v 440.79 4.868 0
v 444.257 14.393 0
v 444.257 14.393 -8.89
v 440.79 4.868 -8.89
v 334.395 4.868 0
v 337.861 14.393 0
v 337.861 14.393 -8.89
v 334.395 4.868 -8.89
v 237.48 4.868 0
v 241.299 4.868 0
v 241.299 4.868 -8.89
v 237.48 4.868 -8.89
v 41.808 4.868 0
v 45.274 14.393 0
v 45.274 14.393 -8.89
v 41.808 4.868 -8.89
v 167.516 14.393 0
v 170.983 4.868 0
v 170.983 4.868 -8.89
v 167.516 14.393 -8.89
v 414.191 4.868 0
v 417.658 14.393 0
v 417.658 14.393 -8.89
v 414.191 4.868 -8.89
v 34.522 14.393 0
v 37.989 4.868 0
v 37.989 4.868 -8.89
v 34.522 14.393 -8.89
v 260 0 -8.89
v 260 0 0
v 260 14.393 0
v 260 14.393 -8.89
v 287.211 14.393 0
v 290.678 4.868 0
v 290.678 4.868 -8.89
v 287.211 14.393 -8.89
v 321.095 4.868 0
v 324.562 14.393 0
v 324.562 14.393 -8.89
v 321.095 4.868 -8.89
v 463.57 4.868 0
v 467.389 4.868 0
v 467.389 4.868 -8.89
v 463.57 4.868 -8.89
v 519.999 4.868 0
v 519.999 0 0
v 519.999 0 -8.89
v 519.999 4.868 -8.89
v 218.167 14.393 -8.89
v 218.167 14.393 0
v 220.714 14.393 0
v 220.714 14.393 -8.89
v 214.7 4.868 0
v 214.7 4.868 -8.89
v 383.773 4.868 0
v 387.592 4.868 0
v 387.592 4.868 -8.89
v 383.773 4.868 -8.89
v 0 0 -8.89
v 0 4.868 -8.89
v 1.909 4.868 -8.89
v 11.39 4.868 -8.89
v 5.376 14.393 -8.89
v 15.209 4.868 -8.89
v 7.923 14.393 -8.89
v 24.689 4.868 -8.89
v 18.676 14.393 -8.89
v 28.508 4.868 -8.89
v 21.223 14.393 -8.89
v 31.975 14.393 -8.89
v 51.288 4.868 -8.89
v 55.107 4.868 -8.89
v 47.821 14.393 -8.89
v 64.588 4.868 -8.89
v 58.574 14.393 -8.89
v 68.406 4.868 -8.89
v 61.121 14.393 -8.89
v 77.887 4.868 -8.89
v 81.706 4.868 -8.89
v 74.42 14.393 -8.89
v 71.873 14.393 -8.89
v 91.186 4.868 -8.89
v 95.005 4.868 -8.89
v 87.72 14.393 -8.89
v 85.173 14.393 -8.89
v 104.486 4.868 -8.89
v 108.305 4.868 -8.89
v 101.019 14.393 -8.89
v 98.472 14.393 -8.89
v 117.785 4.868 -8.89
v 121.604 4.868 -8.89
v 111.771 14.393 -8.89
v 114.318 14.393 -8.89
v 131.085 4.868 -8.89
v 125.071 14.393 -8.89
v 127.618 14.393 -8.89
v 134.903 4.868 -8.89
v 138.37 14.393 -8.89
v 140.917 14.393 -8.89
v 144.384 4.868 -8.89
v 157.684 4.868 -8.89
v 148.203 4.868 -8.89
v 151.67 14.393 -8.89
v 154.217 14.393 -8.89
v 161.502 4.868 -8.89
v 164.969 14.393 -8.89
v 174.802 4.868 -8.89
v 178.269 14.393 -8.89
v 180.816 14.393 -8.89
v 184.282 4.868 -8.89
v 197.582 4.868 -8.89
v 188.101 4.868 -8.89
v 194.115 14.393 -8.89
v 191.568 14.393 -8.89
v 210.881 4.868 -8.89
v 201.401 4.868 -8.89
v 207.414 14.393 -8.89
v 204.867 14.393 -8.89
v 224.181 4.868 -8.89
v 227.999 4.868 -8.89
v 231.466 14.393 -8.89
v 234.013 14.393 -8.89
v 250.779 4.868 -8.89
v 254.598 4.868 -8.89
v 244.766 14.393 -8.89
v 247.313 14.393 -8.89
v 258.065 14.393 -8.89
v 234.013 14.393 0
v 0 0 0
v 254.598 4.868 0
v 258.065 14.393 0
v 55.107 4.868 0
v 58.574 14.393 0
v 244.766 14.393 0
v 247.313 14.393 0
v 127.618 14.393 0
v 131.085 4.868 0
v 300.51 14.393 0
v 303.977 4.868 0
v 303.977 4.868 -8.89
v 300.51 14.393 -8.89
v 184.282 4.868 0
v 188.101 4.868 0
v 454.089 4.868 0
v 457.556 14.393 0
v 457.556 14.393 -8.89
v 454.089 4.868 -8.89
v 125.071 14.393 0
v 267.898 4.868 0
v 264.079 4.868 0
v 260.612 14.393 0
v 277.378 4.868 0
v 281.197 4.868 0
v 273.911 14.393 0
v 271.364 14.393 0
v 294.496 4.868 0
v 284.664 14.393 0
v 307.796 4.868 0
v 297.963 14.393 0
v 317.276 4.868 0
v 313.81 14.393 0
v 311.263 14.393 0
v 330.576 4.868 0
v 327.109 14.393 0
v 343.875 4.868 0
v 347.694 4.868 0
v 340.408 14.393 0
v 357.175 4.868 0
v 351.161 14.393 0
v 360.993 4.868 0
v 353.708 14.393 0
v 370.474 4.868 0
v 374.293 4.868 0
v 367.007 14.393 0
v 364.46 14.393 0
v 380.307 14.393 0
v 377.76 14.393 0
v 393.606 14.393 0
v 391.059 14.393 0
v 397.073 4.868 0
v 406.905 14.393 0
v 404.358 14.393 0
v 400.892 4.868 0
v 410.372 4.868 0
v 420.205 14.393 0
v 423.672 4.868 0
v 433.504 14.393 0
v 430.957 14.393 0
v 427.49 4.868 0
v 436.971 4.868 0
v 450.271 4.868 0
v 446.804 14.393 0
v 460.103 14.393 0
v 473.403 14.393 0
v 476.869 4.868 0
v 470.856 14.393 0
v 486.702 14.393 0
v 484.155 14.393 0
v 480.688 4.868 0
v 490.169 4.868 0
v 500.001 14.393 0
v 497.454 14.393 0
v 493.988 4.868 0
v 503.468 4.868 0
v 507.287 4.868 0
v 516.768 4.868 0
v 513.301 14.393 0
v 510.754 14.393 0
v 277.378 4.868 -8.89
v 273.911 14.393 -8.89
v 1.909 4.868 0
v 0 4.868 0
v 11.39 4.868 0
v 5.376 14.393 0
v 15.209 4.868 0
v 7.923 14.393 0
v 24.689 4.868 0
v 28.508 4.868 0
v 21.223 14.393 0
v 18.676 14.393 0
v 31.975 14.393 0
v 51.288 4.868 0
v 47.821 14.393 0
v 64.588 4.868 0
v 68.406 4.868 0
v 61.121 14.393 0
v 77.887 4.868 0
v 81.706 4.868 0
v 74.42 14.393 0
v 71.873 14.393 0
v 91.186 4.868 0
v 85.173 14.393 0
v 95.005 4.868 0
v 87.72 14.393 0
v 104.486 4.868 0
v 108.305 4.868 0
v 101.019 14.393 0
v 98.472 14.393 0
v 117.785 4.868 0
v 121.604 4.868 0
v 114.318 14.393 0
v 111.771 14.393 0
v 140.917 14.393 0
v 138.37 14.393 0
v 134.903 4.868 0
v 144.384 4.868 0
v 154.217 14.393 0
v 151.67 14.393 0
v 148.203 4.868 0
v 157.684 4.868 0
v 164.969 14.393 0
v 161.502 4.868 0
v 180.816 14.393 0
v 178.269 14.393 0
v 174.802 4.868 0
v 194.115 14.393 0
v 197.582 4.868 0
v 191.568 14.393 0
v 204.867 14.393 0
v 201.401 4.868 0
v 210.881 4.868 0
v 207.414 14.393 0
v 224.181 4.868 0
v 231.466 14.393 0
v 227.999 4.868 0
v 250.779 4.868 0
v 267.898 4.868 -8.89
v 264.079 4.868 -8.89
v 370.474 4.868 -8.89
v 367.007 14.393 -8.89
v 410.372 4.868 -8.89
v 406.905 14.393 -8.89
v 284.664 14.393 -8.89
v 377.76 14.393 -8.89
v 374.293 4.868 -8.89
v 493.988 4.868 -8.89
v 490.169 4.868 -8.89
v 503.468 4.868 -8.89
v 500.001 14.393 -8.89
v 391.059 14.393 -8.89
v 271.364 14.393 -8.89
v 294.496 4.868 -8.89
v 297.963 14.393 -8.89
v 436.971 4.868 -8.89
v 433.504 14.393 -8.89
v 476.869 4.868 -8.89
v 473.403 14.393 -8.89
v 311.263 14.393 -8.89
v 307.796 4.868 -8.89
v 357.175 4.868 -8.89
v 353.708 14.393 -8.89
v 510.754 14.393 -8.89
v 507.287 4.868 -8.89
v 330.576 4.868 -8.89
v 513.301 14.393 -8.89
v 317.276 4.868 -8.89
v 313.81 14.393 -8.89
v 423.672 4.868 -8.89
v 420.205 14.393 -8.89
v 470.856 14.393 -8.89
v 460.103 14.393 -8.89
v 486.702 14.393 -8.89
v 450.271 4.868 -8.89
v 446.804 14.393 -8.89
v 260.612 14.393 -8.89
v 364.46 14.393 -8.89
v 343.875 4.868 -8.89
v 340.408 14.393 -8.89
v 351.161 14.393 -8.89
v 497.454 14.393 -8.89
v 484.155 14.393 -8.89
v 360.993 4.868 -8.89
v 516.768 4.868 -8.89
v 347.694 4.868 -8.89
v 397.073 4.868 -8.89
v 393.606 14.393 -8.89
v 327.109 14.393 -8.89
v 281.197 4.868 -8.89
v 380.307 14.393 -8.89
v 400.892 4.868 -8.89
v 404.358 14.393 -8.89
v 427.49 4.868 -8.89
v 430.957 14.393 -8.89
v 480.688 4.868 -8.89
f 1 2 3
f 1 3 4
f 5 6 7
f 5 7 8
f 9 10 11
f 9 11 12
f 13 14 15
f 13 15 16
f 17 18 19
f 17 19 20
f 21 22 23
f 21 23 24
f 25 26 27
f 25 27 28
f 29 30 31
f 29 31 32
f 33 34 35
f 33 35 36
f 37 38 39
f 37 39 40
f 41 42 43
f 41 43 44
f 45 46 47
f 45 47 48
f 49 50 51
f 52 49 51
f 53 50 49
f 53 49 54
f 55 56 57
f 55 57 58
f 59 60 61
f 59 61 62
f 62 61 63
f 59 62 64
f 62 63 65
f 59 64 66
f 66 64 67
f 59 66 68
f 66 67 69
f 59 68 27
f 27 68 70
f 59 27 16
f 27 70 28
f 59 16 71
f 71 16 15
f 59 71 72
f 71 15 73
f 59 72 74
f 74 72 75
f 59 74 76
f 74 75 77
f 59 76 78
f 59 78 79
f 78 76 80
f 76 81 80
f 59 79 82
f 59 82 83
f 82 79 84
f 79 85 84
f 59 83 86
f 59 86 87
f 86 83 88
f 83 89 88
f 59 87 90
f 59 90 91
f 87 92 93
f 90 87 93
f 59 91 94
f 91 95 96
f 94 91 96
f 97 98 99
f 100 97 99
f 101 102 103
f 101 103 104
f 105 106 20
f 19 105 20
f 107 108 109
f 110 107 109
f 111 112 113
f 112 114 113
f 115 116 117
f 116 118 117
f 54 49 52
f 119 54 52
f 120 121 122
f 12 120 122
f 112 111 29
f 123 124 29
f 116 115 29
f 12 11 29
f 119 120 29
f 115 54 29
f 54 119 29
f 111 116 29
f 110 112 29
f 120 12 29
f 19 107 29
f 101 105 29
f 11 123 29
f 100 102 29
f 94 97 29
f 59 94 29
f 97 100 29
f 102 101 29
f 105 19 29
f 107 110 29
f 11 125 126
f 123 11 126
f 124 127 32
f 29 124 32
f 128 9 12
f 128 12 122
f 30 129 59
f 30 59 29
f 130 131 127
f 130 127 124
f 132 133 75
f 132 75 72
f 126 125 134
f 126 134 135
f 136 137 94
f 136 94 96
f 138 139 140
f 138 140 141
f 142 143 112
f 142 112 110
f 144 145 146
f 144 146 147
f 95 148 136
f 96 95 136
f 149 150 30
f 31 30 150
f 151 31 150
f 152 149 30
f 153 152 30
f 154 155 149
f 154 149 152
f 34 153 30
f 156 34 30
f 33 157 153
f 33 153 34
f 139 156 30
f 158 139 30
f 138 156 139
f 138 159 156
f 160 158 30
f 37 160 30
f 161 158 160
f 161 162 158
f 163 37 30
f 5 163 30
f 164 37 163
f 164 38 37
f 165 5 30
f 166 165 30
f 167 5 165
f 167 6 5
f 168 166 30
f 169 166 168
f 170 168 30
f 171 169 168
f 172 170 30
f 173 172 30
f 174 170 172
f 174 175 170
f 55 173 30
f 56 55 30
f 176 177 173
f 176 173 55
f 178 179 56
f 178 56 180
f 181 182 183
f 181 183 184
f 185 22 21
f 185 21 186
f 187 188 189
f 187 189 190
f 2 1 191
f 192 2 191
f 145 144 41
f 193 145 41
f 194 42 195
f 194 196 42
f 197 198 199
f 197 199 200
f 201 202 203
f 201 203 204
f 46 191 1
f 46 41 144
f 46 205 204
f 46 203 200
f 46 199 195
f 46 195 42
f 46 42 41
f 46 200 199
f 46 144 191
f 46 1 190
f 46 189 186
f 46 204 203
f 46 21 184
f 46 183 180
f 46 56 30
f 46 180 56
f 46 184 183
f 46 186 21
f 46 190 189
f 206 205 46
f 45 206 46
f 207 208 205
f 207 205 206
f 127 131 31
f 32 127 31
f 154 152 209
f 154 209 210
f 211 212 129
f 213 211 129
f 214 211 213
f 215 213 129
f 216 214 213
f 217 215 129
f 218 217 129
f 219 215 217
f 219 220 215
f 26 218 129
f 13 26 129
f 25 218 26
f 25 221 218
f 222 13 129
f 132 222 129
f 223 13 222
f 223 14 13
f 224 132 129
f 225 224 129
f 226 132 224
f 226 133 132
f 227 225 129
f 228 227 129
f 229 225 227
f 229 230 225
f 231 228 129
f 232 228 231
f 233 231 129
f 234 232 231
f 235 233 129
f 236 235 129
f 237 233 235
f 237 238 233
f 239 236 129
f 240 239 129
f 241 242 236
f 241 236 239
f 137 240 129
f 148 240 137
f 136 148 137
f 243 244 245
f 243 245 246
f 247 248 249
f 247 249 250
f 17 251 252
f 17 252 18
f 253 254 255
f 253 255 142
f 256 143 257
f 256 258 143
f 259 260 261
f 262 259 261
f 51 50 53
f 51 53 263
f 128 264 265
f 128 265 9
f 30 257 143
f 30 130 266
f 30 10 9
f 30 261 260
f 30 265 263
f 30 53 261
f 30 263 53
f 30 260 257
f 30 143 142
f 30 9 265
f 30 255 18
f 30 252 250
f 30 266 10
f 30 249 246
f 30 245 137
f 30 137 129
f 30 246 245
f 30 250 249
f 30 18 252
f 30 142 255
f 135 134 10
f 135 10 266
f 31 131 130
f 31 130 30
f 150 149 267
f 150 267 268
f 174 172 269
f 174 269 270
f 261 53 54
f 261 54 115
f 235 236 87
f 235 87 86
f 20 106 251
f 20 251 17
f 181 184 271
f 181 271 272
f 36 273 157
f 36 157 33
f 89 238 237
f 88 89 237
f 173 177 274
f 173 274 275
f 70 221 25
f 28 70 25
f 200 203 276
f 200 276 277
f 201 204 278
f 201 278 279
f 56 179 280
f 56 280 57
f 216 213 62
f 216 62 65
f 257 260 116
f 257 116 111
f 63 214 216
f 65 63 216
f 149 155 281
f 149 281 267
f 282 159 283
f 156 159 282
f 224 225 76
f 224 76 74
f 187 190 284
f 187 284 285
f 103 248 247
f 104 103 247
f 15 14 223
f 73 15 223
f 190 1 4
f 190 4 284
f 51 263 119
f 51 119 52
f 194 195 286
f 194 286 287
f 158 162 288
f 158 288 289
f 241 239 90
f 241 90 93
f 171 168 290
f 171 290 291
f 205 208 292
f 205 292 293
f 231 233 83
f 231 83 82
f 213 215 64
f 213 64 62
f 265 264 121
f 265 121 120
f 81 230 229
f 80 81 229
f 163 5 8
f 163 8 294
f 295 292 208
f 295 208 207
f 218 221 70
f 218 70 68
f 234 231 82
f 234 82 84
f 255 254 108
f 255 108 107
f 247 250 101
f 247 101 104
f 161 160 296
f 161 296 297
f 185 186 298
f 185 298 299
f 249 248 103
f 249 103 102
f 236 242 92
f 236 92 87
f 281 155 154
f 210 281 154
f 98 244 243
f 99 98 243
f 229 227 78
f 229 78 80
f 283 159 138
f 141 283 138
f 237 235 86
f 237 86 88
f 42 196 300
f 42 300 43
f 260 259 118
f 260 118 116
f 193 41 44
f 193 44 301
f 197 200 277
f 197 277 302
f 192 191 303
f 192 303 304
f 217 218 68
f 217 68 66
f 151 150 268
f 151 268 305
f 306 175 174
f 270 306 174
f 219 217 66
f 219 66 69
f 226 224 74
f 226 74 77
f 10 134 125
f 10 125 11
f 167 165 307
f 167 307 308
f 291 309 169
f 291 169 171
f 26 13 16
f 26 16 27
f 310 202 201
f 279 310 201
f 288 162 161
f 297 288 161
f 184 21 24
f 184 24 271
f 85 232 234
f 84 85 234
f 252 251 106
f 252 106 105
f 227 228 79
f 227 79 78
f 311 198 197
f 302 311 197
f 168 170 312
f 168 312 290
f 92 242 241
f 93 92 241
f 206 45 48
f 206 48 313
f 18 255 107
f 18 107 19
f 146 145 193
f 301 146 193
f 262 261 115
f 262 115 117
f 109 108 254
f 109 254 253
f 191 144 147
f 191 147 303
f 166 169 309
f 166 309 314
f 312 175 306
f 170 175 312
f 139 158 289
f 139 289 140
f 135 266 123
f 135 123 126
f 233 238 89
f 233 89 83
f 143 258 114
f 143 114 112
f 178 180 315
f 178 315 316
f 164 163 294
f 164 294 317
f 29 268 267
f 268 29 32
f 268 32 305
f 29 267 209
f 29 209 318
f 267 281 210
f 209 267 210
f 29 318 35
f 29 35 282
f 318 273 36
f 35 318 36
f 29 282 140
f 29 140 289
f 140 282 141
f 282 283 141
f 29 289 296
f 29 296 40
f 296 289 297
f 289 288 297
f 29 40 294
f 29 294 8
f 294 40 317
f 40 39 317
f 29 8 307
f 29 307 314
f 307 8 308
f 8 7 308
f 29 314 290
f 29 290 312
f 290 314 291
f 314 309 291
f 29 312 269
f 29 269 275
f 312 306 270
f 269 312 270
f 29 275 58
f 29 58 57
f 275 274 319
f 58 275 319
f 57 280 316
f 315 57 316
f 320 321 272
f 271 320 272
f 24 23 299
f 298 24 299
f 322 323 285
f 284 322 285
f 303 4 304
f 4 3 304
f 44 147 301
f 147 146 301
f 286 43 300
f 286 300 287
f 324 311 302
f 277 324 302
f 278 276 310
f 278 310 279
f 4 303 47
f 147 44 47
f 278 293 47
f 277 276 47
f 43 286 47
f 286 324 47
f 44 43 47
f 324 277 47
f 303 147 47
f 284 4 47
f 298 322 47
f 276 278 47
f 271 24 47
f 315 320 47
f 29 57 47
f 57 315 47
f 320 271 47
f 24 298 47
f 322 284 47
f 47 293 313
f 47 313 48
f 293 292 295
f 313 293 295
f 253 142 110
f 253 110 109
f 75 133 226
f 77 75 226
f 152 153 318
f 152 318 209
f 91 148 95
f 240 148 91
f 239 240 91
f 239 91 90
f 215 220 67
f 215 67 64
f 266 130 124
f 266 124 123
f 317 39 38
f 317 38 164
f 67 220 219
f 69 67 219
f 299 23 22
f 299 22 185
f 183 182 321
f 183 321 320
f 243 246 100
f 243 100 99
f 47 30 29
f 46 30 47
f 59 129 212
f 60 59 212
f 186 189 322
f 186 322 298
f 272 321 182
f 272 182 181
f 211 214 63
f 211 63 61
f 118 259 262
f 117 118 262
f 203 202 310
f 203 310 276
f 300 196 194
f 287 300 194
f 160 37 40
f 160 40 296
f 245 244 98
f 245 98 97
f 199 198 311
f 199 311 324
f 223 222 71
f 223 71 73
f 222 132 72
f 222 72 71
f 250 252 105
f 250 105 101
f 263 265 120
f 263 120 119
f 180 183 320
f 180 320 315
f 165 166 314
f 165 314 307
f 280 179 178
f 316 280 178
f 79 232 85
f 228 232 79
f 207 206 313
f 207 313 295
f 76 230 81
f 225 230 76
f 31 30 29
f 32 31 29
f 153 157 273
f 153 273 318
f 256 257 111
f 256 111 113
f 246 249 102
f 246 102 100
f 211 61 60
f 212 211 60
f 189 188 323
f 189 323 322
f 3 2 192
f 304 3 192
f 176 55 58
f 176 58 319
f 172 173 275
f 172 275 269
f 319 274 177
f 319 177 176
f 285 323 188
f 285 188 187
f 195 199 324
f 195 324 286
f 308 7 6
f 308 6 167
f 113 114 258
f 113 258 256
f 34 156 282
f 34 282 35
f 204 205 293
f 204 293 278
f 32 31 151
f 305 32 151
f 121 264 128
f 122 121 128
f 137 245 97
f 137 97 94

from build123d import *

# Parameters (mm, degrees)
BLANKSKE_W        = 519.99896
BLANKSKE_H        = 14.393333333
BLANK_DEPTH       = 8.89
TOOTHCUTSIM_DEPTH = 521.274080217
TEETHCUTS_COUNT   = 40
TEETHCUTS_PITCH   = 13.299408885


with BuildPart() as part:
    # BlankSke → Blank (new body)
    with BuildSketch(Plane.XY):
        with Locations((259.99948, 7.196666667)):
            Rectangle(BLANKSKE_W, BLANKSKE_H)
    extrude(amount=-BLANK_DEPTH)

    # TooCutSkeSim → ToothCutSim (cut, through all)
    with BuildSketch(Plane.XY):
        Polygon((1.909383065, 4.868333333), (-1.909383065, 4.868333333), (-5.38544439, 14.418733333), (5.38544439, 14.418733333), align=None)
    toothcutsim = extrude(amount=-TOOTHCUTSIM_DEPTH, mode=Mode.SUBTRACT)

    # TeethCuts: ToothCutSim ×40
    with Locations(*[(i * TEETHCUTS_PITCH, 0, 0) for i in range(1, TEETHCUTS_COUNT)]):
        add(toothcutsim, mode=Mode.SUBTRACT)


with BuildPart() as body_2:
    # Split1: the piece on the far side of the plane
    add(part.part)
    split(bisect_by=Plane(origin=(259.999999938, 0, 0), x_dir=(0, 0, -1), z_dir=(-1, 0, 0)), keep=Keep.BOTTOM)


with BuildPart() as part_1:
    add(part.part)

    # Split1
    split(bisect_by=Plane(origin=(259.999999938, 0, 0), x_dir=(0, 0, -1), z_dir=(-1, 0, 0)), keep=Keep.TOP)


solid = Compound([body_2.part, part_1.part])
